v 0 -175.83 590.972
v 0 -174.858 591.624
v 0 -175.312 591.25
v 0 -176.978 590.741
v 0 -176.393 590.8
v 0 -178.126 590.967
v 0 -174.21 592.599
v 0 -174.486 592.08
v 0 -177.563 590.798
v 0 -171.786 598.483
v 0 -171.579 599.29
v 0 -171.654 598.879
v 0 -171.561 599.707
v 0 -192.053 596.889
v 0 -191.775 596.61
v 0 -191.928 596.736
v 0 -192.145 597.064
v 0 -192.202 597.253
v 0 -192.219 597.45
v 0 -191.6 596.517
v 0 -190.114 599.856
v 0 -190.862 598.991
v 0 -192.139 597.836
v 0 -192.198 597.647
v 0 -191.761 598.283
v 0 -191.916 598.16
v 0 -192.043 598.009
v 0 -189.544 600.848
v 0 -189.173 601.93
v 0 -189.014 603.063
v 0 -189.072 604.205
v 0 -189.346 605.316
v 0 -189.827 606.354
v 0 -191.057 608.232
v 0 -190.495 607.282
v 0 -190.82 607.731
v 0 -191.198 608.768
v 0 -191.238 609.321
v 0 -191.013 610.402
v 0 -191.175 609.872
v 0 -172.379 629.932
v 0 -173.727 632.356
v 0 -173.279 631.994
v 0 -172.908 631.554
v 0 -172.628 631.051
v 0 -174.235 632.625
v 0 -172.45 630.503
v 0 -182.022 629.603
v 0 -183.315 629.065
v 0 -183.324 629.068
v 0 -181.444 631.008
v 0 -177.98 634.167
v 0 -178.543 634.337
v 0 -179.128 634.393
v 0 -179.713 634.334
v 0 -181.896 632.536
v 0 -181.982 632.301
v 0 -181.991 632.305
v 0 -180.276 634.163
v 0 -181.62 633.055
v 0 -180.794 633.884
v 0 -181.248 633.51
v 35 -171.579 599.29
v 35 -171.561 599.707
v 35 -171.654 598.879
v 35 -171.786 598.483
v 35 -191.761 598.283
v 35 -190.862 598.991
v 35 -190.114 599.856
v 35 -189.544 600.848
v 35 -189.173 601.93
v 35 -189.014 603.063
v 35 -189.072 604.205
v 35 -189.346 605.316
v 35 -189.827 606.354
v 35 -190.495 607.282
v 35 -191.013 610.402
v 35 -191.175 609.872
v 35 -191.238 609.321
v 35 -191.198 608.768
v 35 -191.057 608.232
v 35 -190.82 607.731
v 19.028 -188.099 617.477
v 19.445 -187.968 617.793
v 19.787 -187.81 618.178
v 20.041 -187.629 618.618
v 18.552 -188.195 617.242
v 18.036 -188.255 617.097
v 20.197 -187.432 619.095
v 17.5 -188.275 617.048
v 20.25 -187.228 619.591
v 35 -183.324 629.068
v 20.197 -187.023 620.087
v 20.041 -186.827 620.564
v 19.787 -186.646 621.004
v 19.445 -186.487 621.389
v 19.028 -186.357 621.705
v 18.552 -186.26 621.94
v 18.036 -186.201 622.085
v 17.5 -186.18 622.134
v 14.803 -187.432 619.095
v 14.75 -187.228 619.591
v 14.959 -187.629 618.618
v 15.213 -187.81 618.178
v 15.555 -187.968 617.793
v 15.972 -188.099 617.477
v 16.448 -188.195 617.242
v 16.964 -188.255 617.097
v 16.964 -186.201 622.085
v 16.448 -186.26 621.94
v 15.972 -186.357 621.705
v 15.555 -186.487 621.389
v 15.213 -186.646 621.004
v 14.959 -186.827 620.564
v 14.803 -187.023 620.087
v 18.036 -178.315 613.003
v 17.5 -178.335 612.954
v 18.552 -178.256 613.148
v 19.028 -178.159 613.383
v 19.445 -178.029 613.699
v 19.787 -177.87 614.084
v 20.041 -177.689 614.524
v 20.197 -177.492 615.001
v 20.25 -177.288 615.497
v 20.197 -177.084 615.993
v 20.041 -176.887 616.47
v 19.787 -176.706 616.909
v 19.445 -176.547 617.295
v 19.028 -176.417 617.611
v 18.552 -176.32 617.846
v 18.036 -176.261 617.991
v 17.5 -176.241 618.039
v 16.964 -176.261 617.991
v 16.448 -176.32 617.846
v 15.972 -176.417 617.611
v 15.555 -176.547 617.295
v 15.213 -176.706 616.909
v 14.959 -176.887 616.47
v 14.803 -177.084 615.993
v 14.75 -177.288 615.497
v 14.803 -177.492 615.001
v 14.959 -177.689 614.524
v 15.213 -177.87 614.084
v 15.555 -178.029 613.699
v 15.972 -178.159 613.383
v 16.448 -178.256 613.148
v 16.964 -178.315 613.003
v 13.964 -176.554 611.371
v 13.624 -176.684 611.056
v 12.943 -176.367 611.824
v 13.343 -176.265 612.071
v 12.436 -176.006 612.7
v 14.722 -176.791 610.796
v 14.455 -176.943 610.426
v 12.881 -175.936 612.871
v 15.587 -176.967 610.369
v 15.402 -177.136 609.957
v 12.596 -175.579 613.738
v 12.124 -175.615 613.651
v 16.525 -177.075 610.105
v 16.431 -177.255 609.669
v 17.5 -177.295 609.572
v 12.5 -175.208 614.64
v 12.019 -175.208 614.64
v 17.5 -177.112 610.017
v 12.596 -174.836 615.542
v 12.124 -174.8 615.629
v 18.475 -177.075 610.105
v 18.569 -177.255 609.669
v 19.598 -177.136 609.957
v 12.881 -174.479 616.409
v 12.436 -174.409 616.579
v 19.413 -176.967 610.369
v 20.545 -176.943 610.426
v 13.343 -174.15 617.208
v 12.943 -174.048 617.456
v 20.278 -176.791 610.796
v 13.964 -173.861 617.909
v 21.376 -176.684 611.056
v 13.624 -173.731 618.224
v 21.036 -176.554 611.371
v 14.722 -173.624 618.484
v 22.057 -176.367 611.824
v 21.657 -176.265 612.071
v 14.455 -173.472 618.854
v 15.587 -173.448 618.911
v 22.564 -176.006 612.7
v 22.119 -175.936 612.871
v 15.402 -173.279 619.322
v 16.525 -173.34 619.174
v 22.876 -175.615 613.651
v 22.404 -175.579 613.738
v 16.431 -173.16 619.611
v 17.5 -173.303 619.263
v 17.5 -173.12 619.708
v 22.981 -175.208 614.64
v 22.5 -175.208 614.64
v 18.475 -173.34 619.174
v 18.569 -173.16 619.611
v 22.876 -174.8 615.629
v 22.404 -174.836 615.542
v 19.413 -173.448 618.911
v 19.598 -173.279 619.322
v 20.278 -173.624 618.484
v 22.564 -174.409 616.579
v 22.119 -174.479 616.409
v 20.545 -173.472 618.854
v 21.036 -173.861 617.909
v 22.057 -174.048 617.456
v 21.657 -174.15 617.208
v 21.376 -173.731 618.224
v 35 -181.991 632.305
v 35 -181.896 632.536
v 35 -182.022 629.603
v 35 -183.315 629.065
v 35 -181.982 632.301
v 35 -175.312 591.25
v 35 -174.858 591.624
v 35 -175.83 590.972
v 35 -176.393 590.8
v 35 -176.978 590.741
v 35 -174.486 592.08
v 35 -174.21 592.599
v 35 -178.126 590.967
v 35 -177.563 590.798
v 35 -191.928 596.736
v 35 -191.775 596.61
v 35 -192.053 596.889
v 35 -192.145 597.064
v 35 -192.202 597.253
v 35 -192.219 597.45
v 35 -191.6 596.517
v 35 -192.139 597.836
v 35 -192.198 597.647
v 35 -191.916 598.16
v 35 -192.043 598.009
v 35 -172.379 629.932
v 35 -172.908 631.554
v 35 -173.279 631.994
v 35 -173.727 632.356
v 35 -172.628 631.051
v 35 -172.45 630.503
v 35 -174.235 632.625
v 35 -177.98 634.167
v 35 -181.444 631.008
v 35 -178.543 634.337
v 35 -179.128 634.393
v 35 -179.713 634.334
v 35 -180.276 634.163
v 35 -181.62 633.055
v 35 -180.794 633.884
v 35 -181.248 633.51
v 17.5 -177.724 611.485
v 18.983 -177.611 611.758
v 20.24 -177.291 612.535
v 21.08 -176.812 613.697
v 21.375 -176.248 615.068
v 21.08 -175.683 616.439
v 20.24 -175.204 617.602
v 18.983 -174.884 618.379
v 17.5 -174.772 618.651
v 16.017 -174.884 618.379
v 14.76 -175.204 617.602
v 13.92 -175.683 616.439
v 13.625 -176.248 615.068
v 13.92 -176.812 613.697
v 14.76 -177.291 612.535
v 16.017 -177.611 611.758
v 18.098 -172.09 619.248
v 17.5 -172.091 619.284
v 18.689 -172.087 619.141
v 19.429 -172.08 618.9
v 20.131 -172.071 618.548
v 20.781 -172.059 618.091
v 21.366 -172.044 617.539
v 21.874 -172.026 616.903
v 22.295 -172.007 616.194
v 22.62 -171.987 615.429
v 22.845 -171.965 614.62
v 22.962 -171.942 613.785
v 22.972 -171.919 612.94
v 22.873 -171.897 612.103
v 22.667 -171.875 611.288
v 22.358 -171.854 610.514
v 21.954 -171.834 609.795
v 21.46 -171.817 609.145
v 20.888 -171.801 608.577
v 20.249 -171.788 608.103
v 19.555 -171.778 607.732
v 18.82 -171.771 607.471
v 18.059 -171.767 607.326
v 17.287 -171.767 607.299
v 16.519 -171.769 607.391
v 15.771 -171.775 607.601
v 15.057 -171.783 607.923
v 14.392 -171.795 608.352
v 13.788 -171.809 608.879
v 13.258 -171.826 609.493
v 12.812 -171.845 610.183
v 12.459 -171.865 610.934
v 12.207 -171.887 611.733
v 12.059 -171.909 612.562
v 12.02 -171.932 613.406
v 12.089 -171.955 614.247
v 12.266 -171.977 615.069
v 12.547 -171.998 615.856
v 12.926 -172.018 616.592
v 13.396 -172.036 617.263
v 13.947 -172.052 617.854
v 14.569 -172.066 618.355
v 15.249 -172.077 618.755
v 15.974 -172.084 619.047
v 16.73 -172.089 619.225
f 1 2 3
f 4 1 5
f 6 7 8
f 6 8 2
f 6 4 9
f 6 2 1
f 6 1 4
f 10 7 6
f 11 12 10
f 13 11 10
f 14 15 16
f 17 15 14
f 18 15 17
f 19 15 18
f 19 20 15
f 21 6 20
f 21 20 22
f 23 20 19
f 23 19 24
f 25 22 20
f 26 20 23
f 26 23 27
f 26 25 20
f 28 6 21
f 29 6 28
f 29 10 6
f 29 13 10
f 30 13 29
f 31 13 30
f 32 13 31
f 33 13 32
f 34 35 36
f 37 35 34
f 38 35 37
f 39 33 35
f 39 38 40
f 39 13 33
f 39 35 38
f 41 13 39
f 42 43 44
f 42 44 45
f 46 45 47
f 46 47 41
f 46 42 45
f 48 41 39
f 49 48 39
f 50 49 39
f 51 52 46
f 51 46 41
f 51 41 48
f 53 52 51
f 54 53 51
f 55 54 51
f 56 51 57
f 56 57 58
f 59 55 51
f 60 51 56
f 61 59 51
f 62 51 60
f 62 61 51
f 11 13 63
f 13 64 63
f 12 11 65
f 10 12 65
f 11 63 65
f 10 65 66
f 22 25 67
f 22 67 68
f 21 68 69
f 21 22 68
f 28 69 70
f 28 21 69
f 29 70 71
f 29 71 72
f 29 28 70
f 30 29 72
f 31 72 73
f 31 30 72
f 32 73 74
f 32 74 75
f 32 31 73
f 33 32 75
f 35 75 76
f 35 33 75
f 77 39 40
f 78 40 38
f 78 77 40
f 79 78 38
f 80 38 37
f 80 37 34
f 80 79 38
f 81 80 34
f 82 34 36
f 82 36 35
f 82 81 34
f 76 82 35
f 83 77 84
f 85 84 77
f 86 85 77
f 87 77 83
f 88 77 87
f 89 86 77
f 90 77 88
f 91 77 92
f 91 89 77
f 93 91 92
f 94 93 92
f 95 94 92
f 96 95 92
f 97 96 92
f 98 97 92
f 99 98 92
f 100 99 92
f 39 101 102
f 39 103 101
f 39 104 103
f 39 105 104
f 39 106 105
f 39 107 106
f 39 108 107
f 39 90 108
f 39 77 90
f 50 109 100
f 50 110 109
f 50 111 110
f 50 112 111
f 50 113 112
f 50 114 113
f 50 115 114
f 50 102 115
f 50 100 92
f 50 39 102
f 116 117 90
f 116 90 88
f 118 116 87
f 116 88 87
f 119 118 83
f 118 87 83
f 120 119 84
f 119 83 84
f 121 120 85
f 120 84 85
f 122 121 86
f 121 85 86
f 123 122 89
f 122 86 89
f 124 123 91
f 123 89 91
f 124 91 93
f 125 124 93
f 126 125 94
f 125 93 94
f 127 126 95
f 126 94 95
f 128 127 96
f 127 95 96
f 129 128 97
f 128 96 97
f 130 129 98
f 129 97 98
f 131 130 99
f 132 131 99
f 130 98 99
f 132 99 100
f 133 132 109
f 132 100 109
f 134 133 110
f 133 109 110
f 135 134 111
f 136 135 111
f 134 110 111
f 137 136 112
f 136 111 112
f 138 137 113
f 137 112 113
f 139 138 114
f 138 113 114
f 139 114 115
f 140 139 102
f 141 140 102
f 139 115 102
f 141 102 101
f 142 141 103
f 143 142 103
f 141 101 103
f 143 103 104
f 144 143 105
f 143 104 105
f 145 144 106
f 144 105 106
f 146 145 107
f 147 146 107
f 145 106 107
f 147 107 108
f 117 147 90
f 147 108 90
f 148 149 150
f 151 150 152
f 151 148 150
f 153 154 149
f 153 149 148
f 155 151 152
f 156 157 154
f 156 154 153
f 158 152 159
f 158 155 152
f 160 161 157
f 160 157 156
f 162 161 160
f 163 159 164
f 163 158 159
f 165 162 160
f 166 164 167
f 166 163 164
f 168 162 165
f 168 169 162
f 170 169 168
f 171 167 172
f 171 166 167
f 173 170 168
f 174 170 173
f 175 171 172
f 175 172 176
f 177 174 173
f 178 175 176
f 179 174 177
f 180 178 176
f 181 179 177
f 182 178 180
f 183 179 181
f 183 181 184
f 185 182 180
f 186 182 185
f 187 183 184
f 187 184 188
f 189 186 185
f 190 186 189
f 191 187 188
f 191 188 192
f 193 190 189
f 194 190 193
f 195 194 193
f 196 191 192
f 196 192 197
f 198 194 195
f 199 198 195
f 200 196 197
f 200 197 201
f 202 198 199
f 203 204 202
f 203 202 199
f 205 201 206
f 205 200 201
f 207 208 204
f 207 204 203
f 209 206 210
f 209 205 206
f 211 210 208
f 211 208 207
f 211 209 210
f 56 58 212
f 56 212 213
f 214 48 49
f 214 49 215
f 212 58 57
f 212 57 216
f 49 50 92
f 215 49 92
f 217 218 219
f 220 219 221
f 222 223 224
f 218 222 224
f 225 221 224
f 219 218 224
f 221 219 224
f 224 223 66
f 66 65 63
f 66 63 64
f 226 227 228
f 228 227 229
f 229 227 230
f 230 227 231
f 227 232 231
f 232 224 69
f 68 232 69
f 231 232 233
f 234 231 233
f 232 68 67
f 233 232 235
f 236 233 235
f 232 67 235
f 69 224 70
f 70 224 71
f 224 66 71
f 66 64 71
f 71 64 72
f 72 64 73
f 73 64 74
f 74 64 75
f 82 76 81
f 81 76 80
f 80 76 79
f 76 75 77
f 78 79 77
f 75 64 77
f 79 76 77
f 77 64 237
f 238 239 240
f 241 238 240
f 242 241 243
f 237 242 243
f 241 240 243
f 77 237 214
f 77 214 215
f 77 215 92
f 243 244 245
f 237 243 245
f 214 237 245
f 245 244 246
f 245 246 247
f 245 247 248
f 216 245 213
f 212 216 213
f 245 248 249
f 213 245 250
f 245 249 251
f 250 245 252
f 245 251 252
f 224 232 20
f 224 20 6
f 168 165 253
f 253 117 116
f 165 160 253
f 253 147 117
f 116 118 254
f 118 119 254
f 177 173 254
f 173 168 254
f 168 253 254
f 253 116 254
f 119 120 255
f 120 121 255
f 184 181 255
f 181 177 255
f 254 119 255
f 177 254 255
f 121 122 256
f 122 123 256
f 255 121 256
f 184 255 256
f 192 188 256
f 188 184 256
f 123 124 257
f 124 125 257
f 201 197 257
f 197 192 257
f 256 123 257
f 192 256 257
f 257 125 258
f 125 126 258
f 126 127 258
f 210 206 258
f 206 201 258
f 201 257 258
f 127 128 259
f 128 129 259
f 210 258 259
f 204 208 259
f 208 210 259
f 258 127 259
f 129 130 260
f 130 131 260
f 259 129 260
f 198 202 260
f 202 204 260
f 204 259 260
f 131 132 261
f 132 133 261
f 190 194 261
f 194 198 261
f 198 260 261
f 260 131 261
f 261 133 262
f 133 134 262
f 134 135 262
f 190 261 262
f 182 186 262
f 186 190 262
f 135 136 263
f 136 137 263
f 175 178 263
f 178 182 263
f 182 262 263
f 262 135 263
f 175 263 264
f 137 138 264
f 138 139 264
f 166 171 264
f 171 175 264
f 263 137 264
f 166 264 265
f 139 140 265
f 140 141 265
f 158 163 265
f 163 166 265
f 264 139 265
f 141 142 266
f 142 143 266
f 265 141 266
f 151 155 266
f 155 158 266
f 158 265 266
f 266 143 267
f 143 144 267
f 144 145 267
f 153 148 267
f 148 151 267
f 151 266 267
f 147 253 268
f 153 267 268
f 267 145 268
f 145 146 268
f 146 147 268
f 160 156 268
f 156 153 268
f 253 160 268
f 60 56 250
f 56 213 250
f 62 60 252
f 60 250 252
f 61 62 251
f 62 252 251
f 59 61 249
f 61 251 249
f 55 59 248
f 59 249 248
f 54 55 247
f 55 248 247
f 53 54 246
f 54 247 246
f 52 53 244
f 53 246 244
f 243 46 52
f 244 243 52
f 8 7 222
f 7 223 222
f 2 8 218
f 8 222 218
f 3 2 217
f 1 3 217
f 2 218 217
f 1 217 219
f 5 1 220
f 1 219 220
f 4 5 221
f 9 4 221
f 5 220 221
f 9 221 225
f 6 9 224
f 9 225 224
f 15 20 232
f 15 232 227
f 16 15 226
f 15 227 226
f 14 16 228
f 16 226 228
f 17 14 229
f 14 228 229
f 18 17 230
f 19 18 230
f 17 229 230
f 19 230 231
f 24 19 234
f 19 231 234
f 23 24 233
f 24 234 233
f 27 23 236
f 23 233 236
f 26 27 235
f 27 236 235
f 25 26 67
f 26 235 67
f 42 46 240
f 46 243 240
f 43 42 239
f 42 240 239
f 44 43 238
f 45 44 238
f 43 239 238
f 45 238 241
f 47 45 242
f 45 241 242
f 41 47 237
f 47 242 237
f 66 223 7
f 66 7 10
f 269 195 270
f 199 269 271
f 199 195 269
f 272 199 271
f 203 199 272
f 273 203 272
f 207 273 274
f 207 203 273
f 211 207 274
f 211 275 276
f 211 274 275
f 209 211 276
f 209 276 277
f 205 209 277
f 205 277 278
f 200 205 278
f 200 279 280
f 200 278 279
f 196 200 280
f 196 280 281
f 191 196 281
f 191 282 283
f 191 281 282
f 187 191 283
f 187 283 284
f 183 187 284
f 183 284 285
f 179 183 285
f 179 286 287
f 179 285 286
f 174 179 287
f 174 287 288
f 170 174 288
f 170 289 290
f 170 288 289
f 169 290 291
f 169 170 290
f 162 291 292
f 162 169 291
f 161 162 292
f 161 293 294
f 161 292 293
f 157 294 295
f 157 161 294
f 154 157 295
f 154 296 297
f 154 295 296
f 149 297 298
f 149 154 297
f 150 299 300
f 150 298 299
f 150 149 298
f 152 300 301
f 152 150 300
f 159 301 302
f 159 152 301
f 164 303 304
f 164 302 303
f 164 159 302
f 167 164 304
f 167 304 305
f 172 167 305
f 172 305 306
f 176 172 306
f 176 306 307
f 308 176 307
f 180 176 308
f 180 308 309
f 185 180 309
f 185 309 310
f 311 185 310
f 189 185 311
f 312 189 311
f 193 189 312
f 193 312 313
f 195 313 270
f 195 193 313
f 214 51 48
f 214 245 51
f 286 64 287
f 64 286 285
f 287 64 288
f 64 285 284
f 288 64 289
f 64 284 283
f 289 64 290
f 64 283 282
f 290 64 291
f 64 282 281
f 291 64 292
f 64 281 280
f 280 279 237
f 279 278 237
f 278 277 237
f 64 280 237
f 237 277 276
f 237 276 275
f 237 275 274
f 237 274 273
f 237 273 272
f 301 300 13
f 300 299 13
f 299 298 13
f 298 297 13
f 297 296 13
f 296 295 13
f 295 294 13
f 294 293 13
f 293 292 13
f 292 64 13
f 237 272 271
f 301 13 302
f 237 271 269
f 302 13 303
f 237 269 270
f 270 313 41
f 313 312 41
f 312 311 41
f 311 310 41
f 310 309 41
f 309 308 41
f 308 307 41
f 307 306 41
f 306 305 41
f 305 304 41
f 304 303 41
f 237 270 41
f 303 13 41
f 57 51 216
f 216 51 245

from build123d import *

# Parameters (mm, degrees)
PAD001_DEPTH        = 35
HOLE002_D           = 5.5
HOLE002_CSINK_D     = 10
HOLE002_CSINK_ANGLE = 90
SKETCH004_R         = 6.501169
SKETCH004_R_2       = 5.481256
POCKET_DEPTH        = 12.8390795694
SKETCH007_W         = 3.5
SKETCH007_H         = 35
POCKET002_DEPTH     = 1
CHAMFER_SIZE        = 0.99
FILLET007_R         = 3
FILLET008_R         = 1


with BuildPart() as part:
    # Sketch002 → Pad001 (new body)
    with BuildSketch(Plane.YZ):
        with BuildLine():
            Line((-191.8299400553, 608.417587482), (-180.7534222613, 635.3096898309))
            Line((-172.4316788603, 631.8820686779), (-180.7534222613, 635.3096898309))
            Line((-171.5440233176, 599.0713301394), (-172.4316788603, 631.8820686779))
            Line((-175.3524912653, 589.8249485827), (-171.5440233176, 599.0713301394))
            Line((-193.8452543786, 597.4418844782), (-175.3524912653, 589.8249485827))
            ThreePointArc((-193.8452543786, 597.4418844782), (-189.1063549521, 602.2446203225), (-191.8299400553, 608.417587482))
        make_face()
    extrude(amount=PAD001_DEPTH)

    # Hole002 (through all)
    with Locations(Plane(origin=(0, -366.2373103971, 150.8485291635), x_dir=(0, 0.3808467948, 0.9246381557), z_dir=(0, 0.9246381557, -0.3808467948))):
        with Locations((-506.967621, 13.13074), (501.5922183693, 17.5)):
            CounterSinkHole(HOLE002_D / 2, HOLE002_CSINK_D / 2, counter_sink_angle=HOLE002_CSINK_ANGLE)

    # Sketch004 (on DatumPlane) → Pocket (cut, through all)
    with BuildSketch(Plane(origin=(0, -366.2373103971, 150.8485291635), x_dir=(0, 0.3808467948, 0.9246381557), z_dir=(0, 0.9246381557, -0.3808467948))):
        with Locations((-506.967621, 13.13074)):
            Circle(SKETCH004_R)
        with Locations((501.5922183693, 17.5)):
            Circle(SKETCH004_R_2)
    extrude(amount=POCKET_DEPTH, mode=Mode.SUBTRACT)

    # Sketch007 (on Face6 of Pocket) → Pocket002 (cut)
    with BuildSketch(Plane(origin=(0, -378.2576064208, 155.7995374955), x_dir=(0, -0.3808467948, -0.9246381557), z_dir=(0, -0.9246381557, 0.3808467948))):
        with Locations((-513.5922183693, 17.5)):
            Rectangle(SKETCH007_W, SKETCH007_H)
    extrude(amount=-POCKET002_DEPTH, mode=Mode.SUBTRACT)

    # Chamfer
    chamfer_edges = [part.edges().sort_by_distance(p)[0] for p in [
        (17.5, -181.066536, 631.923769),
        (17.5, -182.3995, 628.687535),
    ]]
    chamfer(chamfer_edges, length=CHAMFER_SIZE)

    # Fillet007
    fillet007_edges = [part.edges().sort_by_distance(p)[0] for p in [
        (17.5, -175.352491, 589.824949),
        (17.5, -191.82994, 608.417587),
        (17.5, -171.544023, 599.07133),
        (17.5, -172.431679, 631.882069),
        (17.5, -180.753422, 635.30969),
    ]]
    fillet(fillet007_edges, radius=FILLET007_R)

    # Fillet008
    fillet008_edges = [part.edges().sort_by_distance(p)[0] for p in [
        (17.5, -193.845254, 597.441884),
    ]]
    fillet(fillet008_edges, radius=FILLET008_R)


solid = part.part
